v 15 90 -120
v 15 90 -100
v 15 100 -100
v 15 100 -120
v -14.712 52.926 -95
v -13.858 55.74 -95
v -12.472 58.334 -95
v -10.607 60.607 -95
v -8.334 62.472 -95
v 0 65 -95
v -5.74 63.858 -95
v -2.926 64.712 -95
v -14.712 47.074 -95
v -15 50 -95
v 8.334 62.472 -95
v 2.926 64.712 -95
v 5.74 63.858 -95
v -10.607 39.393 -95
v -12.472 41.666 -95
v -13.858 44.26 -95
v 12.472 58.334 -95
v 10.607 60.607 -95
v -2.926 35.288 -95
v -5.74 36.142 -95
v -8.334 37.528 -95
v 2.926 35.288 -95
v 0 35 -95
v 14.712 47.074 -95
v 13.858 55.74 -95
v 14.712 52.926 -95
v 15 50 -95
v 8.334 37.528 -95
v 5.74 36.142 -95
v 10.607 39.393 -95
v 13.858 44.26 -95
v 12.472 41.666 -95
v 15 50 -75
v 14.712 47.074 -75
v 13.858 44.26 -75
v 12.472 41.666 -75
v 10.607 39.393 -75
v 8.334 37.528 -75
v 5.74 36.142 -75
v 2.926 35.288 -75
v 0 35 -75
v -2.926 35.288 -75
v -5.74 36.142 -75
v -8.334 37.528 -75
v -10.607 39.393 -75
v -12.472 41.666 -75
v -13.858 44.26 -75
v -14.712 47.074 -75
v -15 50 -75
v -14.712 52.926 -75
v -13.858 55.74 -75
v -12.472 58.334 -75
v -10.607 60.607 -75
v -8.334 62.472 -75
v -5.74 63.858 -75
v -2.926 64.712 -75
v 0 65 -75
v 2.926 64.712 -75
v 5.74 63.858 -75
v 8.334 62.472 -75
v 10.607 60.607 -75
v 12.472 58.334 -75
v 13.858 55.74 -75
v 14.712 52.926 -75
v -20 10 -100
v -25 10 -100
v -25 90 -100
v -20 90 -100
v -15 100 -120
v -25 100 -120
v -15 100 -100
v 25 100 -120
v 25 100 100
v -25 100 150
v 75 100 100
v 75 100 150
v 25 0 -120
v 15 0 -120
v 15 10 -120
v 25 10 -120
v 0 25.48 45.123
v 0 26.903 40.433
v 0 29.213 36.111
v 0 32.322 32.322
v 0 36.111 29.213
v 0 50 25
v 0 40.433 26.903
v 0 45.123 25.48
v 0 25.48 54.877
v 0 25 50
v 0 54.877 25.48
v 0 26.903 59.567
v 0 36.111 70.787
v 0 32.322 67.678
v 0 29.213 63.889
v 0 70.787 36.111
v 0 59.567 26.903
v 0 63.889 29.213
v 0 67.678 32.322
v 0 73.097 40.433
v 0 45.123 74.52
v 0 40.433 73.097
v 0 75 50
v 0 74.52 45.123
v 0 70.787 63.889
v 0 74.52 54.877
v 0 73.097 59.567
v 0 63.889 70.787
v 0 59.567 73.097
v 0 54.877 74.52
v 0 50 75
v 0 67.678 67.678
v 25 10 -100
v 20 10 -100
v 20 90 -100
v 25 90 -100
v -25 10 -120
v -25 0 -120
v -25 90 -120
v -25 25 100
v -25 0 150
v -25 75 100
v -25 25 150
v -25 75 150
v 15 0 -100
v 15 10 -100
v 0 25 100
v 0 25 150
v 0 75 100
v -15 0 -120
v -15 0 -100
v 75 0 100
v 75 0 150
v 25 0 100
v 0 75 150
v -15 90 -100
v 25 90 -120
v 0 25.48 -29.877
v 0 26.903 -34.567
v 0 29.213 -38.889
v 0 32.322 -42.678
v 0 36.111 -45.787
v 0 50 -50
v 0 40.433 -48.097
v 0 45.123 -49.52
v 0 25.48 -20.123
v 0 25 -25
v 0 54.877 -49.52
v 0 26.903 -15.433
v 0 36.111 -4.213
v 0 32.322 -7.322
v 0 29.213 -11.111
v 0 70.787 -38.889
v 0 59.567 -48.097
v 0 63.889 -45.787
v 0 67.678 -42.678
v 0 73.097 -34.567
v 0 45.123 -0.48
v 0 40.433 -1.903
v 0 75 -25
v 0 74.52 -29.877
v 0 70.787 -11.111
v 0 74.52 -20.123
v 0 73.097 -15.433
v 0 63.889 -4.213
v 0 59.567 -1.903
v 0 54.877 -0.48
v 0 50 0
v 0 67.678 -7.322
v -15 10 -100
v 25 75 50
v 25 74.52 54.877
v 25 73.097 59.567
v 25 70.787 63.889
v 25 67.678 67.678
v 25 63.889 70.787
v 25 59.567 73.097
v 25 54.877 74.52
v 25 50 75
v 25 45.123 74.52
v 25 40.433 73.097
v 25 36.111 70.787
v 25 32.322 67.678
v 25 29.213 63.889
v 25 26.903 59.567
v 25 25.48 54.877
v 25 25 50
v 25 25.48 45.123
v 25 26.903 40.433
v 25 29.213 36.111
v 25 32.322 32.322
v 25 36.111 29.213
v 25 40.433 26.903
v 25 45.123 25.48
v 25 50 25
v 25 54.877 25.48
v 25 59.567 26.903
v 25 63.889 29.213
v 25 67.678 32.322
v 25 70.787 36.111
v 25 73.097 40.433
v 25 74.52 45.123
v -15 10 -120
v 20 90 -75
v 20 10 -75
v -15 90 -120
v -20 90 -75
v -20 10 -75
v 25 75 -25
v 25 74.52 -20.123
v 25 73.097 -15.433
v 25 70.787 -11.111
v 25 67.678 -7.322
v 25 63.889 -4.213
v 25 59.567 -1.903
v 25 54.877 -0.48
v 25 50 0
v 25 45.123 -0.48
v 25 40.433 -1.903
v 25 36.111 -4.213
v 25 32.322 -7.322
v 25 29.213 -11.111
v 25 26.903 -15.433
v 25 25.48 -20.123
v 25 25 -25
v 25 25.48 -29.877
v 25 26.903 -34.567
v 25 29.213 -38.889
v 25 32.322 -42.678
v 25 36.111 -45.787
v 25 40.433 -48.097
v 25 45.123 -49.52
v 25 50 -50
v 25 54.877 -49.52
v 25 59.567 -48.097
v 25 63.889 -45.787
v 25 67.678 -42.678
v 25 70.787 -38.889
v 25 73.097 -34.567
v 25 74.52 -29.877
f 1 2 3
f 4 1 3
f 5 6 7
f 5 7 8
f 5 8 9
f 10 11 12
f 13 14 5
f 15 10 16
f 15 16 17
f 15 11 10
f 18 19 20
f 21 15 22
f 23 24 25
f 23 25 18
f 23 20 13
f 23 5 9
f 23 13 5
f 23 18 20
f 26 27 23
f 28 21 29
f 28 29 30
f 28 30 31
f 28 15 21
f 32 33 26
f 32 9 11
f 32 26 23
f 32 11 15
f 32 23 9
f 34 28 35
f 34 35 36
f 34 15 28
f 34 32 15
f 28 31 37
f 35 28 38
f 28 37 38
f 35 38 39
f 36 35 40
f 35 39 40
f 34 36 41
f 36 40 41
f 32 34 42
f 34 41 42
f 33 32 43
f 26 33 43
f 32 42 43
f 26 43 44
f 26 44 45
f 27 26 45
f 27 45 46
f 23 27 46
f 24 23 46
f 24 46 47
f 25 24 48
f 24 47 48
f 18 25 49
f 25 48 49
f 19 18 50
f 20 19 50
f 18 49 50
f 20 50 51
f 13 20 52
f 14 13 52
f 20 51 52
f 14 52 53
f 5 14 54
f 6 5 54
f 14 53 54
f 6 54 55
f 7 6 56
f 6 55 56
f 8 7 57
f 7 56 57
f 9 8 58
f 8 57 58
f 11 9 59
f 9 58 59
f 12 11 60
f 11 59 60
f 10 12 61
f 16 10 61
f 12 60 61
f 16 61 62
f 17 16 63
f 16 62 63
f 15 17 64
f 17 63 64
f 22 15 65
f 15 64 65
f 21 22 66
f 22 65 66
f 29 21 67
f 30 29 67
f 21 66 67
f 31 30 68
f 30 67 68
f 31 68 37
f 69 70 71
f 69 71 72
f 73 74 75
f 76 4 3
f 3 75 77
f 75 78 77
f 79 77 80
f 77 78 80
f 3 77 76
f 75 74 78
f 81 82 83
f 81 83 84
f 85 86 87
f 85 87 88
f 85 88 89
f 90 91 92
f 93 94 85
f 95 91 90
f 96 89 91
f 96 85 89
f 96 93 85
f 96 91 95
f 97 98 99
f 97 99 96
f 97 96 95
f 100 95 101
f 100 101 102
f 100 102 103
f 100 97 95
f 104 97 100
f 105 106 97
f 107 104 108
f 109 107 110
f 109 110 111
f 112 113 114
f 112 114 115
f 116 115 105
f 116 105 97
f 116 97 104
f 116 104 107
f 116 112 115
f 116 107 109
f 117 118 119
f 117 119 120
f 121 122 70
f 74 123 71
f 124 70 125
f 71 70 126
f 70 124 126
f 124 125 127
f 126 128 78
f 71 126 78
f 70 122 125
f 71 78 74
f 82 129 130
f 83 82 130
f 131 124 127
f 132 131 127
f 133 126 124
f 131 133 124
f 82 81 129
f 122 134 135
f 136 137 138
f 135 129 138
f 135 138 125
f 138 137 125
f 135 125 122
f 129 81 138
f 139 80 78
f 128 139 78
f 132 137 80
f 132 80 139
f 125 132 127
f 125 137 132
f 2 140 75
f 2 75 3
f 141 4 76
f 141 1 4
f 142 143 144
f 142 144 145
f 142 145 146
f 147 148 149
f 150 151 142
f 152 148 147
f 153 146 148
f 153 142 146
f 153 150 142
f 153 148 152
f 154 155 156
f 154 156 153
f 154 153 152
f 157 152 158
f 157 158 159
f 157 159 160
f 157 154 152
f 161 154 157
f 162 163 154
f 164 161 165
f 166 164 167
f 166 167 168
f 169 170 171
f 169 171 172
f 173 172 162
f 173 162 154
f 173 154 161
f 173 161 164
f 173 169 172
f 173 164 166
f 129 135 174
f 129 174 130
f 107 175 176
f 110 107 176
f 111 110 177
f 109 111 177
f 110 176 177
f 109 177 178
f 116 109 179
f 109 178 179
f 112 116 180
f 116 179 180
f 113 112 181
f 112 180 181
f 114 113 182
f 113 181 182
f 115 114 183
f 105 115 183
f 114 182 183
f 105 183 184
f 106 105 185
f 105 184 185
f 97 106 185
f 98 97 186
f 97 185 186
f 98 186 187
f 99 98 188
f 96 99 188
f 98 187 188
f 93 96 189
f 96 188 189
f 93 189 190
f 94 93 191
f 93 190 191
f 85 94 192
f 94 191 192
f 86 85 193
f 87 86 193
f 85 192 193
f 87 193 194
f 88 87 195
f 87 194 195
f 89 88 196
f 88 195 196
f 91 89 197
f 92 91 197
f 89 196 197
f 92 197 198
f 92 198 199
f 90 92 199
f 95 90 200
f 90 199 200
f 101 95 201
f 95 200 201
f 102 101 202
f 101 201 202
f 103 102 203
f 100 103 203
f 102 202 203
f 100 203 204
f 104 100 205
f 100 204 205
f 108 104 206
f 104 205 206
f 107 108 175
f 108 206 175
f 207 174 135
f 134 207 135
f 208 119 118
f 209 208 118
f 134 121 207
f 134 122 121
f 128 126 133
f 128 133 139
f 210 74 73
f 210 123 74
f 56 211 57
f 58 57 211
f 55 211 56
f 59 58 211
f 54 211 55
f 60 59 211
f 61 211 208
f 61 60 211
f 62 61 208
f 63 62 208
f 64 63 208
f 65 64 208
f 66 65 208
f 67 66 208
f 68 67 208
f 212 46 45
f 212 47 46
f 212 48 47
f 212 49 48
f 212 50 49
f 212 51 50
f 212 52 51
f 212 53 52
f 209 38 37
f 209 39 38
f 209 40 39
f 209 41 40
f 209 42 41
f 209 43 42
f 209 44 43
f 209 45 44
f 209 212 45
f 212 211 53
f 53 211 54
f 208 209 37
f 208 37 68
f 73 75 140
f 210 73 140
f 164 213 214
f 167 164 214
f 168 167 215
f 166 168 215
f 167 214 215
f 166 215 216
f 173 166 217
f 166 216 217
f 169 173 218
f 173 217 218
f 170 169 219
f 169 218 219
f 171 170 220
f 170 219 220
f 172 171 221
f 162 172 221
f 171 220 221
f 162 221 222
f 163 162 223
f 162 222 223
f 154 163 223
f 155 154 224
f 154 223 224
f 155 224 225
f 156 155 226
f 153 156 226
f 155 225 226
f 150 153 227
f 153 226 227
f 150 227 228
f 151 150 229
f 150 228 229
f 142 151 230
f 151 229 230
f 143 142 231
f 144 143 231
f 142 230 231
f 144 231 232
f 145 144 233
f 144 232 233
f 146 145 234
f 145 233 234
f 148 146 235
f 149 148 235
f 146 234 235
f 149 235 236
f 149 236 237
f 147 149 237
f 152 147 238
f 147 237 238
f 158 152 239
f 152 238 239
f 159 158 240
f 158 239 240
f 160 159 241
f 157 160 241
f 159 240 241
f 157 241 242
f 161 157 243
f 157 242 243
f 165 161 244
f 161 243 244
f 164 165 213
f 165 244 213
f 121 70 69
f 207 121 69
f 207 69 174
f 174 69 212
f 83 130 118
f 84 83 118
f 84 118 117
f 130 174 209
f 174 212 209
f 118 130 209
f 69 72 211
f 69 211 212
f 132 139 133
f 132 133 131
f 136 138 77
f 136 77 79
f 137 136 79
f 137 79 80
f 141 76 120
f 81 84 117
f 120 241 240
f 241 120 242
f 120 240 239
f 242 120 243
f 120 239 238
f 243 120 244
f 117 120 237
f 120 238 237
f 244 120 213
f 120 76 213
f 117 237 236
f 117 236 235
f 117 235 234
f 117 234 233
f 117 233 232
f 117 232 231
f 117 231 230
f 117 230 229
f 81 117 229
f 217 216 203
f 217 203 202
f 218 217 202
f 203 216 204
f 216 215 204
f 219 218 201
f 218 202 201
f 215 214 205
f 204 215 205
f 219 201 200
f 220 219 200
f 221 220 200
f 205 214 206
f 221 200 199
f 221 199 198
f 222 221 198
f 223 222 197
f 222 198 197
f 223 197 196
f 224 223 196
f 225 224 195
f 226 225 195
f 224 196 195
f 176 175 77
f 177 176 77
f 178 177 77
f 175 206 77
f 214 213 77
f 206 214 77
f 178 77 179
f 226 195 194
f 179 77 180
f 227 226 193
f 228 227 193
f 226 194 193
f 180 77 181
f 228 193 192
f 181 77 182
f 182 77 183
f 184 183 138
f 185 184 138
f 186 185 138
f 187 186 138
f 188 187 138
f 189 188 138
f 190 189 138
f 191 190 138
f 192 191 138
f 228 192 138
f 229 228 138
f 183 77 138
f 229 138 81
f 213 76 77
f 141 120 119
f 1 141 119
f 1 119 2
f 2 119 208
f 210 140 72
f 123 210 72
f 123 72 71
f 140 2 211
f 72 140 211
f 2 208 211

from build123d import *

# Parameters (mm, degrees)
F1_DEPTH  = 100
F2_R      = 25
F3_DEPTH  = 25
F5_W      = 40
F5_H      = 80
F6_DEPTH  = 25
F7_R      = 15
F8_DEPTH  = 20
F10_DEPTH = 20
F11_W     = 50
F11_H     = 50
F12_DEPTH = 25


with BuildPart() as f1:
    # F0 (on Front) → F1 (new body)
    with BuildSketch(Plane.XZ):
        Polygon((-25, -100), (25, -100), (25, 100), (75, 100), (75, 150), (-25, 150), (-25, 100), align=None)
    extrude(amount=-F1_DEPTH)

    # F2 (on face) → F3 (cut)
    with BuildSketch(Plane.YZ.offset(25)):
        with Locations((50, -25)):
            Circle(F2_R)
        with Locations((50, 50)):
            Circle(F2_R)
    extrude(amount=-F3_DEPTH, mode=Mode.SUBTRACT)

    # F5 (on face) → F6 (cut)
    with BuildSketch(Plane(origin=(0, 0, -100), x_dir=(1, 0, 0), z_dir=(0, 0, -1))):
        with Locations((0, -50)):
            Rectangle(F5_W, F5_H)
    extrude(amount=-F6_DEPTH, mode=Mode.SUBTRACT)

    # F7 (on face) → F8 (join)
    with BuildSketch(Plane(origin=(0, 0, -75), x_dir=(1, 0, 0), z_dir=(0, 0, -1))):
        with Locations((0, -50)):
            Circle(F7_R)
    extrude(amount=F8_DEPTH)

    # F9 (on face) → F10 (join)
    with BuildSketch(Plane(origin=(0, 0, -100), x_dir=(1, 0, 0), z_dir=(0, 0, -1))):
        Polygon((-25, -10), (-20, -10), (-15, -10), (-15, 0), (-25, 0), align=None)
        Polygon((20, -10), (25, -10), (25, 0), (15, 0), (15, -10), align=None)
        Polygon((15, -100), (25, -100), (25, -90), (20, -90), (15, -90), align=None)
        Polygon((-25, -100), (-15, -100), (-15, -90), (-20, -90), (-25, -90), align=None)
    extrude(amount=F10_DEPTH)

    # F11 (on face) → F12 (cut)
    with BuildSketch(Plane(origin=(-25, 0, 0), x_dir=(0, -1, 0), z_dir=(-1, 0, 0))):
        with Locations((-50, 125)):
            Rectangle(F11_W, F11_H)
    extrude(amount=-F12_DEPTH, mode=Mode.SUBTRACT)


solid = f1.part
